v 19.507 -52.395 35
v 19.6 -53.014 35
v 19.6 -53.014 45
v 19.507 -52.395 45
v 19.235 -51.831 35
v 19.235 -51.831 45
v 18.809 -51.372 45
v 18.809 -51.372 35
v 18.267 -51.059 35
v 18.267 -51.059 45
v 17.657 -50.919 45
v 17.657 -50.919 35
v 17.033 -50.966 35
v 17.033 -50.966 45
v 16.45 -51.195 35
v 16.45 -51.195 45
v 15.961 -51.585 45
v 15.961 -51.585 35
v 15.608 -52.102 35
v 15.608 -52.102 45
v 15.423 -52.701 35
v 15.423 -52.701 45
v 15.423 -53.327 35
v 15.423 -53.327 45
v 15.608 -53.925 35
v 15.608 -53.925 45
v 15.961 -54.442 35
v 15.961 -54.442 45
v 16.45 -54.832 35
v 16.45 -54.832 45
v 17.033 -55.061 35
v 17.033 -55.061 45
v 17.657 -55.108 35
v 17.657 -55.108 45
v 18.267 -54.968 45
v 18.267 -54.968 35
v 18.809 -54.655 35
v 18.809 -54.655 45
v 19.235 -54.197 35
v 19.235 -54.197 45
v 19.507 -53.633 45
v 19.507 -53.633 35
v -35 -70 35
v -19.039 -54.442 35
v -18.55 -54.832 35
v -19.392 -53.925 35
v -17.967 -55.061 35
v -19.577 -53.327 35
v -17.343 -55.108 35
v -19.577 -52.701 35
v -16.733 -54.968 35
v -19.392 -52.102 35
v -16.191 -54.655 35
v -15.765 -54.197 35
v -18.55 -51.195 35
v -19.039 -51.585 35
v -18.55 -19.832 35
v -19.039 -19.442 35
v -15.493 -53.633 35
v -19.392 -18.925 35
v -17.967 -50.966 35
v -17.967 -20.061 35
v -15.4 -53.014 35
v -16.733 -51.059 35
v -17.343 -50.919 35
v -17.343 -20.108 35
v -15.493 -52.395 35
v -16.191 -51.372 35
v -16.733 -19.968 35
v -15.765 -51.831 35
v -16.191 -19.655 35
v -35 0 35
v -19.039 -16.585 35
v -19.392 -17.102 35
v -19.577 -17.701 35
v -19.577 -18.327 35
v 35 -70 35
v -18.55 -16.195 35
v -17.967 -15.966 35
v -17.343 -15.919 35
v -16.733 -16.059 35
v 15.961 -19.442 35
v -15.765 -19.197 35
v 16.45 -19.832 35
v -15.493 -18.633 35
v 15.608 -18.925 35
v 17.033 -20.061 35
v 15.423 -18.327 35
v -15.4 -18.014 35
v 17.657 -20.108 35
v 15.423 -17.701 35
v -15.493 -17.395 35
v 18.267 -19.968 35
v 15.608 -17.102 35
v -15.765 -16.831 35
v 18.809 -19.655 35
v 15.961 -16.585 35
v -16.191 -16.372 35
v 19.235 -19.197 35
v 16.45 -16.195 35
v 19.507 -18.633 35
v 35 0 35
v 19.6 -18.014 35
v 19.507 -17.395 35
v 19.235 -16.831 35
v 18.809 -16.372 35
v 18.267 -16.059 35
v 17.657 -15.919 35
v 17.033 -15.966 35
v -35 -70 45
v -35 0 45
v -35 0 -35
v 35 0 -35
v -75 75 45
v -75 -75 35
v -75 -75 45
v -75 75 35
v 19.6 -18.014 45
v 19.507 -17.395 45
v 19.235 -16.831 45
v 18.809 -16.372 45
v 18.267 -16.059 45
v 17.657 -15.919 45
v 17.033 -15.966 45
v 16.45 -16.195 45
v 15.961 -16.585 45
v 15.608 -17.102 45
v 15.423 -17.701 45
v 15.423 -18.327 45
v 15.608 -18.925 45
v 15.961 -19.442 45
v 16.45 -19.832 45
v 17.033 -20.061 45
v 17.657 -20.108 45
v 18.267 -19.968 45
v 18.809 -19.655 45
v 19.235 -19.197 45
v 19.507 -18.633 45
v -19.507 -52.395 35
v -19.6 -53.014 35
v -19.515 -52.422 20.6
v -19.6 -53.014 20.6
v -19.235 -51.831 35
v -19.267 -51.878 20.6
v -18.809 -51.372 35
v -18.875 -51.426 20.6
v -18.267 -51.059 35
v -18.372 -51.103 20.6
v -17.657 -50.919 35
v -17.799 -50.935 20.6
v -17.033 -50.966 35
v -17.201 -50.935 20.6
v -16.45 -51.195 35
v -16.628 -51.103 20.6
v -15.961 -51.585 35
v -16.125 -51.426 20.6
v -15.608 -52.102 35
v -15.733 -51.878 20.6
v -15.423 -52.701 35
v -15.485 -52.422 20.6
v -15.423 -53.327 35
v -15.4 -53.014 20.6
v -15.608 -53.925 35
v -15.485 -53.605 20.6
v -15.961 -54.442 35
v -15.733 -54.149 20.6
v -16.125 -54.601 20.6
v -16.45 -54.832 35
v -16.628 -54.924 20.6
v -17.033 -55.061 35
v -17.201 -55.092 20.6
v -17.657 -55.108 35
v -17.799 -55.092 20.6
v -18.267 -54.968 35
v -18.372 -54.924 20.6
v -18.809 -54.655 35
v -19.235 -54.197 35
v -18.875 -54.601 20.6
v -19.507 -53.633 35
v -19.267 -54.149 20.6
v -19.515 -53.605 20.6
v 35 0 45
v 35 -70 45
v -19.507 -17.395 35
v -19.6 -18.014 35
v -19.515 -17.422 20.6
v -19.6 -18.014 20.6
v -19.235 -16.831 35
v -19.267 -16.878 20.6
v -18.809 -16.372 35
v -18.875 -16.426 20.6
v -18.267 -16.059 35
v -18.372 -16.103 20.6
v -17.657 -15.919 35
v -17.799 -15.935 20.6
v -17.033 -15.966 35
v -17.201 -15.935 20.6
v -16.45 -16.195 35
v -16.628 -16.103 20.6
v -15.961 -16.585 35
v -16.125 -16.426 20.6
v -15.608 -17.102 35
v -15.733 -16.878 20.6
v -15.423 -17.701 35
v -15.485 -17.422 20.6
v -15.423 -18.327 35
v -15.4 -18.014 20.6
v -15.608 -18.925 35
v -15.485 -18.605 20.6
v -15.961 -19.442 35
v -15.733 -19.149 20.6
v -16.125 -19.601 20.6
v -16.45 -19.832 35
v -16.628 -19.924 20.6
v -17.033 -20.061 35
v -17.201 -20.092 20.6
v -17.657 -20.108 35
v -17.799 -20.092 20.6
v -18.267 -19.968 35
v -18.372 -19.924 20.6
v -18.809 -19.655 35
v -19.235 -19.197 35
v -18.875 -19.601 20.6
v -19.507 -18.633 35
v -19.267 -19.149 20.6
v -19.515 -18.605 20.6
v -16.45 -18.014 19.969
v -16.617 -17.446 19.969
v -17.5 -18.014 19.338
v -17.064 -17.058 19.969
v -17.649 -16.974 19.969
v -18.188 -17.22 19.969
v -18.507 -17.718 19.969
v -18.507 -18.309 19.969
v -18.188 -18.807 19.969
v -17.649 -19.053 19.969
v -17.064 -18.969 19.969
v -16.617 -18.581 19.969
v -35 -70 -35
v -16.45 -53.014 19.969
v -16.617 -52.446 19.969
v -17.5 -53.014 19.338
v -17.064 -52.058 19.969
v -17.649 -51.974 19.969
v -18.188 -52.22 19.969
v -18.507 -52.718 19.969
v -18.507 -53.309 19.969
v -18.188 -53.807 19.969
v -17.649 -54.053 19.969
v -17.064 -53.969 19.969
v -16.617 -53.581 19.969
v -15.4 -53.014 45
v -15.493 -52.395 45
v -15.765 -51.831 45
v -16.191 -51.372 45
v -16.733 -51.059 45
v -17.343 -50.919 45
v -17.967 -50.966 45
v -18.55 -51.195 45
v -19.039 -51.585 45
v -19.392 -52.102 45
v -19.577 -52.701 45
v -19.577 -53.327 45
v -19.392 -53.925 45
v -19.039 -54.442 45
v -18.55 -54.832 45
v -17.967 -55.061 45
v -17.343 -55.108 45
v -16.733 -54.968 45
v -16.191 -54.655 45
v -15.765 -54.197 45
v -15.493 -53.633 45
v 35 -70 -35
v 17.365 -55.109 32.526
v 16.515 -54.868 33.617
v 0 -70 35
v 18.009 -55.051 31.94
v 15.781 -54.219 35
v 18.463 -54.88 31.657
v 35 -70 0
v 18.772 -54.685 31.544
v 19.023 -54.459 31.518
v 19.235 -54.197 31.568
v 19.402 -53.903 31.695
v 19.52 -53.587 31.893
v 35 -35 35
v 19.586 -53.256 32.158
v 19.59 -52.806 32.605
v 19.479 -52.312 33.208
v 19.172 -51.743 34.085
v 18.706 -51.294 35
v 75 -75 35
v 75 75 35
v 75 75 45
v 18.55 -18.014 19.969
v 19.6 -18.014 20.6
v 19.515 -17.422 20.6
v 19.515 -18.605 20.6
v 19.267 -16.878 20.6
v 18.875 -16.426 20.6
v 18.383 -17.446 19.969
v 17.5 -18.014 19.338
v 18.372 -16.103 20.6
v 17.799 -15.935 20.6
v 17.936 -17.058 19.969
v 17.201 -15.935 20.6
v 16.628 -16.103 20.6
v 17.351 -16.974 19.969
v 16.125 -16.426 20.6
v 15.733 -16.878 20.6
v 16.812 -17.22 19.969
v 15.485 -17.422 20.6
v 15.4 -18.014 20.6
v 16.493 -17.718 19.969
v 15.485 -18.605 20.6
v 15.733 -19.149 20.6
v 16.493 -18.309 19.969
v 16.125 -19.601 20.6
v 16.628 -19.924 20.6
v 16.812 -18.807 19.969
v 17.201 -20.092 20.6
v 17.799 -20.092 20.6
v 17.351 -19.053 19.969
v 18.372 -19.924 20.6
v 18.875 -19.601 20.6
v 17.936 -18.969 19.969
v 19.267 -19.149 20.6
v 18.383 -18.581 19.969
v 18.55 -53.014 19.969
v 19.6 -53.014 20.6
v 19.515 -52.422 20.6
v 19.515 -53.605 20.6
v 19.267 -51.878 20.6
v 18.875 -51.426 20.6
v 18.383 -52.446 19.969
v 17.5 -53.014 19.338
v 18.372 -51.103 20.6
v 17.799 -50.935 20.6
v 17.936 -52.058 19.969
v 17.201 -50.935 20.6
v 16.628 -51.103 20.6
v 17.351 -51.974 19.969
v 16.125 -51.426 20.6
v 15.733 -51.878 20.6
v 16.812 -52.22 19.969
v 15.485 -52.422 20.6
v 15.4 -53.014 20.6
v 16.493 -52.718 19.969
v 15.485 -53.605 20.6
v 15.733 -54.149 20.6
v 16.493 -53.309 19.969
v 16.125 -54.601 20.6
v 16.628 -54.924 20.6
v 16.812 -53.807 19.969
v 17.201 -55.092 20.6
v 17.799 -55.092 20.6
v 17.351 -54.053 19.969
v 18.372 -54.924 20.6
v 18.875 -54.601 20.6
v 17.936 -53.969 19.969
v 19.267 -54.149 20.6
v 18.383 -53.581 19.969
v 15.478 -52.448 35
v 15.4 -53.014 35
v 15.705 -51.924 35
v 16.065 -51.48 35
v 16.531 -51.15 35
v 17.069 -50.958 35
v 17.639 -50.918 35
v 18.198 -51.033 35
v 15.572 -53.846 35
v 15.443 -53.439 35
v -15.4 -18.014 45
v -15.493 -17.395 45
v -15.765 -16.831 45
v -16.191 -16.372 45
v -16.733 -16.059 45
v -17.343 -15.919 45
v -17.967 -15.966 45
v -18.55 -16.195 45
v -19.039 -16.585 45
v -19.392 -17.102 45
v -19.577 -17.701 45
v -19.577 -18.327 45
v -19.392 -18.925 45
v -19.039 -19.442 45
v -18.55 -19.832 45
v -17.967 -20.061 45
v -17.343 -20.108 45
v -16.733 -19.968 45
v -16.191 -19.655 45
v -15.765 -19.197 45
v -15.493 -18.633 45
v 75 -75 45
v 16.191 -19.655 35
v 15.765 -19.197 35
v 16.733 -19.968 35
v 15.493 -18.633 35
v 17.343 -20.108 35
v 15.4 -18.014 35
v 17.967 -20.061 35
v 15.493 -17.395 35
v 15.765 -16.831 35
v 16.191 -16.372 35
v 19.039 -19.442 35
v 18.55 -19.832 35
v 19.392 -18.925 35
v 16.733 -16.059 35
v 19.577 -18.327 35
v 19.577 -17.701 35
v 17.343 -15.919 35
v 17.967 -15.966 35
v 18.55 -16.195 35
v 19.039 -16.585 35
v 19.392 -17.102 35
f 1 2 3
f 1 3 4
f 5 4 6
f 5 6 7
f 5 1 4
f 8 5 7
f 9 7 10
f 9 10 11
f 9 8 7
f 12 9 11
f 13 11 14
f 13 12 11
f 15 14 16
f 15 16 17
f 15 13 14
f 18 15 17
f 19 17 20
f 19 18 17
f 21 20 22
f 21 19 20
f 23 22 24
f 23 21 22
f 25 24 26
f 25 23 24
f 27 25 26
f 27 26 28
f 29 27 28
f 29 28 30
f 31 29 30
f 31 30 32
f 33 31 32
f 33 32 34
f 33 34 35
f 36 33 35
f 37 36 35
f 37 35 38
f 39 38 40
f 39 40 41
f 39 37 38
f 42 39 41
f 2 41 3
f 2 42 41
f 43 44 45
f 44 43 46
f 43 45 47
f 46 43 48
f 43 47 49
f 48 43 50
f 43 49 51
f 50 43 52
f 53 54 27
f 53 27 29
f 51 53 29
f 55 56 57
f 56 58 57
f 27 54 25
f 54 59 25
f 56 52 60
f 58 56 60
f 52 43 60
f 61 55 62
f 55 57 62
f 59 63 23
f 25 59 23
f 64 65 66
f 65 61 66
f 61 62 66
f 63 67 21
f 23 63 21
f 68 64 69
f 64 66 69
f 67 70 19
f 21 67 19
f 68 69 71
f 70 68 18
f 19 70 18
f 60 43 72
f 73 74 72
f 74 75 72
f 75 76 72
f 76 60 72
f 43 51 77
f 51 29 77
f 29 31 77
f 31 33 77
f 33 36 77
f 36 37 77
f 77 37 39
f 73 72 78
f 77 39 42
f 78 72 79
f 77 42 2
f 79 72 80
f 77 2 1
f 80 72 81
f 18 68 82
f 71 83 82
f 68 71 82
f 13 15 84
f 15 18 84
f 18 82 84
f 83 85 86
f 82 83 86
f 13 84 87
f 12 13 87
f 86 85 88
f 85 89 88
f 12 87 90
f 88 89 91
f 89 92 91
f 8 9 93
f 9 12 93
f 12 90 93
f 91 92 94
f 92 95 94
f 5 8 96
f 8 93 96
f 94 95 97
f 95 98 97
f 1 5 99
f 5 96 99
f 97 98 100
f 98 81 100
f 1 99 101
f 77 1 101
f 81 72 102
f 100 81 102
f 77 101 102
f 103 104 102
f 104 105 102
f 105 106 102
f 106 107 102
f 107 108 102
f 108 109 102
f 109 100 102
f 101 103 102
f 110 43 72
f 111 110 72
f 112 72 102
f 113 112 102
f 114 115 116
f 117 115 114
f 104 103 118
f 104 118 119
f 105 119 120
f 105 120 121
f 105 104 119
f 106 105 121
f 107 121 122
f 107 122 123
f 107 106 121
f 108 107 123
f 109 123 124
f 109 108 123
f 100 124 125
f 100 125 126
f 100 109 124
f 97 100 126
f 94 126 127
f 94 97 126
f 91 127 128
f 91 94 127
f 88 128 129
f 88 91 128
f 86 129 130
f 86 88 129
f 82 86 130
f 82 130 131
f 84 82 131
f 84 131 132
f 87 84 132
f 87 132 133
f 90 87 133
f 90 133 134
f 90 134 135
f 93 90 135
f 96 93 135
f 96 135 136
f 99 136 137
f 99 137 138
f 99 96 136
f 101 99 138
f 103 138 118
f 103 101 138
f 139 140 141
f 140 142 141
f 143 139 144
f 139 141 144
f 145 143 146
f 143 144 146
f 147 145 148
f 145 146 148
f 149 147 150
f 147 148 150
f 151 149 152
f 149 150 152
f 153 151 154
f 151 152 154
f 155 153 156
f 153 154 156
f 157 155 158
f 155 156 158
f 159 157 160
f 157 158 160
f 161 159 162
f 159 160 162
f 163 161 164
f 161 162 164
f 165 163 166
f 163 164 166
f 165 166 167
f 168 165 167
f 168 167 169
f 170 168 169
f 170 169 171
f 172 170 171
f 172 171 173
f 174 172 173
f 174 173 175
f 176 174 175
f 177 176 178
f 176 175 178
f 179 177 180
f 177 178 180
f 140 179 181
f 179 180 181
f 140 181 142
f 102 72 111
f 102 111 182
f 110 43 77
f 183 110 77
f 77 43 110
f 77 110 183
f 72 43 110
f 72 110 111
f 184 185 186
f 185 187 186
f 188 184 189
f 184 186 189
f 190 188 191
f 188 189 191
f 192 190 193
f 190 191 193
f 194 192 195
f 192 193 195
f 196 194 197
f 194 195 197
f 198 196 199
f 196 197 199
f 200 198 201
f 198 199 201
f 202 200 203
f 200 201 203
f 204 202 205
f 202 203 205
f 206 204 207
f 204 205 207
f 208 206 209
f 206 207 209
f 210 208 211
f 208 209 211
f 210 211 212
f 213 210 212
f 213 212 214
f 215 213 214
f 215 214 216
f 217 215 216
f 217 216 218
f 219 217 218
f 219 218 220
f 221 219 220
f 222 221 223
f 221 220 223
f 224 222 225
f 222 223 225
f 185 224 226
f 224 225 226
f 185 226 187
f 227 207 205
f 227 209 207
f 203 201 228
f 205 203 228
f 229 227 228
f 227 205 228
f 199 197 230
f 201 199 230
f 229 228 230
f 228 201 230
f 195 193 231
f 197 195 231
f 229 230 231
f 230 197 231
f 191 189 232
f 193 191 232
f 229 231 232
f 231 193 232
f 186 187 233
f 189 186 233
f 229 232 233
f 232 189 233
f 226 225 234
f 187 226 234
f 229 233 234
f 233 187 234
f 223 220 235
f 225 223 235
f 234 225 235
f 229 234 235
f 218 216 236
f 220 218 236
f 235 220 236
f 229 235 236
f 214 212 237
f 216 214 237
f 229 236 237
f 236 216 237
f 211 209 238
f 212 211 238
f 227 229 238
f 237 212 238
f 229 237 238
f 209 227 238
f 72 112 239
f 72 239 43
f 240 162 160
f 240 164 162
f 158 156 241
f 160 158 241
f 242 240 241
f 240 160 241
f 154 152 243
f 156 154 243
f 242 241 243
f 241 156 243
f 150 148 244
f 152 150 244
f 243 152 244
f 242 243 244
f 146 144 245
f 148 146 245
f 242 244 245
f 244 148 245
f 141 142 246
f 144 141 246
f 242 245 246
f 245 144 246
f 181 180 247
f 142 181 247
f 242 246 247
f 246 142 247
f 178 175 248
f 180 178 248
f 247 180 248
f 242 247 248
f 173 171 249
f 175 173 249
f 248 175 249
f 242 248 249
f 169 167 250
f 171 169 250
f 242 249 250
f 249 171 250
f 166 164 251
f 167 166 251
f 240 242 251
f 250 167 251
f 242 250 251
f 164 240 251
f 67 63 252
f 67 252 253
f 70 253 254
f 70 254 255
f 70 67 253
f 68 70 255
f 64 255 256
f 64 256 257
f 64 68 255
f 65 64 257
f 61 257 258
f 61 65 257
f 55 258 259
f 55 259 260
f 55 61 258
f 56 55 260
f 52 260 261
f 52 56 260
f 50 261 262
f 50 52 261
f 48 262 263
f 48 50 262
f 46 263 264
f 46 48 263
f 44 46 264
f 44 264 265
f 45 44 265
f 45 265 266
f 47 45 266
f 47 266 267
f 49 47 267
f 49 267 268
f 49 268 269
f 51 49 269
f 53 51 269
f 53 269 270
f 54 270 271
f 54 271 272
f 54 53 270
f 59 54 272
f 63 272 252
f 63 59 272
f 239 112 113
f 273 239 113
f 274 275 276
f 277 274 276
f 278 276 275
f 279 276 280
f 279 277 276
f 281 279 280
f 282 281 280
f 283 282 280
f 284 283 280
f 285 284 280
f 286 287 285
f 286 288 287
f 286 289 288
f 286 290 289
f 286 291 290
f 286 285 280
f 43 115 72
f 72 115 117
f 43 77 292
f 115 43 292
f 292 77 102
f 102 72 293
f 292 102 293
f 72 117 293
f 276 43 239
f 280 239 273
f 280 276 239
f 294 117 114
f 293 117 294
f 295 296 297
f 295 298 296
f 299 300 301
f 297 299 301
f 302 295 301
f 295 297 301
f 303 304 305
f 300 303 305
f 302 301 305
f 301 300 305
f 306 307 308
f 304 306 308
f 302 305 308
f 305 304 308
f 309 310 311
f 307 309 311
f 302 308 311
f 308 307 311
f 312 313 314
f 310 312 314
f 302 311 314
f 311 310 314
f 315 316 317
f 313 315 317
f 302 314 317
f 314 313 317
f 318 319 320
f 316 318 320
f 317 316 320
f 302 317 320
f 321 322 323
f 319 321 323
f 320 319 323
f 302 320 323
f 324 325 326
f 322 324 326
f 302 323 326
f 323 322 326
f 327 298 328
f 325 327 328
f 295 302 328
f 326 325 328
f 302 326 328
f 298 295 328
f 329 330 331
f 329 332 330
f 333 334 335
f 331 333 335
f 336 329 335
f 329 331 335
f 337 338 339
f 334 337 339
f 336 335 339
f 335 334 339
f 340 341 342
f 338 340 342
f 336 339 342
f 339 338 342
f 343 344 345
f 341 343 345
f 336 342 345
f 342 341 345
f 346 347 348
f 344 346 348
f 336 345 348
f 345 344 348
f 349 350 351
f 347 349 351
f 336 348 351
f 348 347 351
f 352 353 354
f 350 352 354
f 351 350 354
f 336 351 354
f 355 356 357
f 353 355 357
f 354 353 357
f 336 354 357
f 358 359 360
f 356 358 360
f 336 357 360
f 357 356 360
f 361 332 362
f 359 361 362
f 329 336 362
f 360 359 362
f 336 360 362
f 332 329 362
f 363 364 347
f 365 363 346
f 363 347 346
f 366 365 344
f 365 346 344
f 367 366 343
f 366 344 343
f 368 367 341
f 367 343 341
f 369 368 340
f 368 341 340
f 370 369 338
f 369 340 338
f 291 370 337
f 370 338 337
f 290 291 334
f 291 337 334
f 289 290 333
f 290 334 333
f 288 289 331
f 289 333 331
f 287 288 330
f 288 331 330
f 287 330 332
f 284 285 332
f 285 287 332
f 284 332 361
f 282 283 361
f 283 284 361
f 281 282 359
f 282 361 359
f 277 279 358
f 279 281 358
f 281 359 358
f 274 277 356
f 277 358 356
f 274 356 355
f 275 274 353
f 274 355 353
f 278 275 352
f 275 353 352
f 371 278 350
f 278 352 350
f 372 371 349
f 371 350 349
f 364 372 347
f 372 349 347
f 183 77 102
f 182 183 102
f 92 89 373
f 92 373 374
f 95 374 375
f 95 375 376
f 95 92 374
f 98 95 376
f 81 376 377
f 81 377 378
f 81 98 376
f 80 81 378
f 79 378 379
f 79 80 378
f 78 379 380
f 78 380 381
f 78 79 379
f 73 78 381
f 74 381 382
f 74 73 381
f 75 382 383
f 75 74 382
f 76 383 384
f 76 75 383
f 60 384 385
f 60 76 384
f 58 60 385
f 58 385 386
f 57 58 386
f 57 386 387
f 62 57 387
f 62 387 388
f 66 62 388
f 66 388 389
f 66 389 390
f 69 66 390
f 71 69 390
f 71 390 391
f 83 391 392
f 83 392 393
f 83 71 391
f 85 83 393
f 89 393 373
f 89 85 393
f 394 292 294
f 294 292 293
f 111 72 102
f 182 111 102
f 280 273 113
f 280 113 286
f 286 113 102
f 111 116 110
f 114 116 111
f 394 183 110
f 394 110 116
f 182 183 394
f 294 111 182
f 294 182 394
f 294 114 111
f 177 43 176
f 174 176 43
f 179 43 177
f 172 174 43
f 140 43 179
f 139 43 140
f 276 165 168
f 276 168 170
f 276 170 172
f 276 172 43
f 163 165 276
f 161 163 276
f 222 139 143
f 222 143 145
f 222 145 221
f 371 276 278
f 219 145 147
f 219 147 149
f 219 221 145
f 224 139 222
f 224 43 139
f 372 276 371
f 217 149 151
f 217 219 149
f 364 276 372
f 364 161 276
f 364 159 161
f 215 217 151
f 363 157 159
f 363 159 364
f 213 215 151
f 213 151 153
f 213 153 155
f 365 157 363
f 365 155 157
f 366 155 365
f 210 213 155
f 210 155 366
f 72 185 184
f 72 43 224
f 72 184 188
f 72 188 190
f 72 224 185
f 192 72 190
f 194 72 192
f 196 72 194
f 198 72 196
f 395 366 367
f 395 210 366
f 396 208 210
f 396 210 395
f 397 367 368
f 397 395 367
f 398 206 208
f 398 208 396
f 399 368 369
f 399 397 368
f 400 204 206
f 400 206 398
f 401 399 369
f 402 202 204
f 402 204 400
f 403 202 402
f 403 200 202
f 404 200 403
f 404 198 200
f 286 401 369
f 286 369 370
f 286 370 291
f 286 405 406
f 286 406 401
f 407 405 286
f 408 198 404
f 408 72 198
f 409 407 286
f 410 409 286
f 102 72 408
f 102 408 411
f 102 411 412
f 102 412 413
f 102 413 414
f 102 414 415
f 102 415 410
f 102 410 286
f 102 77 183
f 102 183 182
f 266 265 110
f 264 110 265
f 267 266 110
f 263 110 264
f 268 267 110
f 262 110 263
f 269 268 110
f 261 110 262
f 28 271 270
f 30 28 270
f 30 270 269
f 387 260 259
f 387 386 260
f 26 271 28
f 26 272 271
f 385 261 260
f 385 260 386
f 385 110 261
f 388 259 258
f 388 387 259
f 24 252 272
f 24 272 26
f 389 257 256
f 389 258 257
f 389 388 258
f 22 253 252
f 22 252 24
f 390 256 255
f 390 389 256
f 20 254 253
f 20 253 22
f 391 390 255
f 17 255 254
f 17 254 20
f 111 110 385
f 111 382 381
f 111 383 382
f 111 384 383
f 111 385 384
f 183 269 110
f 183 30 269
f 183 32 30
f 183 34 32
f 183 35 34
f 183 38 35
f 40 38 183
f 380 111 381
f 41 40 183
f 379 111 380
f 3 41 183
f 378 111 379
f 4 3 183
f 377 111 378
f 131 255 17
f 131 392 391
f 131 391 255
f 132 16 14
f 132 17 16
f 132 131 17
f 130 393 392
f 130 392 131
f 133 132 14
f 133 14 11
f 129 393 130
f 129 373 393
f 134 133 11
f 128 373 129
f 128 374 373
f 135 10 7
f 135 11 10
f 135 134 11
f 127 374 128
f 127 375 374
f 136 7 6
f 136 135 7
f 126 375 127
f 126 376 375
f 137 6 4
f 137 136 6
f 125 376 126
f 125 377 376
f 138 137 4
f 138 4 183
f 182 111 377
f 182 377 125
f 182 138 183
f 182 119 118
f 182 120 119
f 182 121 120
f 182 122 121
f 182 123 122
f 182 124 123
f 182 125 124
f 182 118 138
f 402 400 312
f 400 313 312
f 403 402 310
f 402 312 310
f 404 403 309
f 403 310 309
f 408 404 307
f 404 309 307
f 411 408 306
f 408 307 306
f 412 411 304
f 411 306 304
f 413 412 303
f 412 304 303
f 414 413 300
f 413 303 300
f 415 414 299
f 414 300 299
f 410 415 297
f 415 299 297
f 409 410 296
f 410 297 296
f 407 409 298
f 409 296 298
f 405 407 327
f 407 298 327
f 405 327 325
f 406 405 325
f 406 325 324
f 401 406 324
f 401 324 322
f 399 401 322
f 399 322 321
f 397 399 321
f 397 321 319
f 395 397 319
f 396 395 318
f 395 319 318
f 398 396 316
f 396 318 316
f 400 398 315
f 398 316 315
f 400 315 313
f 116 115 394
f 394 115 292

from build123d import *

# Parameters (mm, degrees)
F0_W      = 70
F0_H      = 70
F1_DEPTH  = 70
F3_D      = 4.2
F3_DEPTH  = 14.4
F3_TIP    = 1.2618073
F7_W      = 42.8660704987
F7_H      = 49.4974746831
F8_DEPTH  = 20.2072594216
F9_W      = 150
F9_H      = 150
F9_W_2    = 70
F9_H_2    = 70
F10_DEPTH = 10
F4_W      = 70
F4_H      = 70
F4_R      = 2.1


with BuildPart() as f1:
    # F0 (on Front) → F1 (new body)
    with BuildSketch(Plane.XZ):
        Rectangle(F0_W, F0_H)
    extrude(amount=F1_DEPTH)

    # F3
    with Locations(Plane.XY.offset(35)):
        with Locations((-17.5, -53.0135591482), (-17.5, -18.0135591482), (17.5, -18.0135591482), (17.5, -53.0135591482)):
            Hole(F3_D / 2, depth=F3_DEPTH)
            with Locations((0, 0, -(F3_DEPTH + F3_TIP / 2))):  # 118° drill point
                Cone(0, F3_D / 2, F3_TIP, mode=Mode.SUBTRACT)

    # F7 (on 3pt) → F8 (cut, through all)
    with BuildSketch(Plane(origin=(35, -35, 35), x_dir=(0.8164965809, 0.4082482905, -0.4082482905), z_dir=(0.5773502692, -0.5773502692, 0.5773502692))):
        with Locations((-21.4330352494, -24.7487373415)):
            Rectangle(F7_W, F7_H)
    extrude(amount=F8_DEPTH, mode=Mode.SUBTRACT)


with BuildPart() as f10:
    # F9 (on face) → F10 (new body)
    with BuildSketch(Plane.XY.offset(35)):
        Rectangle(F9_W, F9_H)
        with Locations((0, -35)):
            Rectangle(F9_W_2, F9_H_2, mode=Mode.SUBTRACT)
    extrude(amount=F10_DEPTH)


with BuildPart() as f10b:
    # F4 (on face) → F10, piece 2 (new body)
    with BuildSketch(Plane.XY.offset(35)):
        with Locations((0, -35)):
            Rectangle(F4_W, F4_H)
        with Locations((-17.5, -53.0135591482)):
            Circle(F4_R, mode=Mode.SUBTRACT)
        with Locations((17.5, -53.0135591482)):
            Circle(F4_R, mode=Mode.SUBTRACT)
        with Locations((-17.5, -18.0135591482)):
            Circle(F4_R, mode=Mode.SUBTRACT)
        with Locations((17.5, -18.0135591482)):
            Circle(F4_R, mode=Mode.SUBTRACT)
    extrude(amount=F10_DEPTH)


solid = Compound([f1.part, f10.part, f10b.part])
